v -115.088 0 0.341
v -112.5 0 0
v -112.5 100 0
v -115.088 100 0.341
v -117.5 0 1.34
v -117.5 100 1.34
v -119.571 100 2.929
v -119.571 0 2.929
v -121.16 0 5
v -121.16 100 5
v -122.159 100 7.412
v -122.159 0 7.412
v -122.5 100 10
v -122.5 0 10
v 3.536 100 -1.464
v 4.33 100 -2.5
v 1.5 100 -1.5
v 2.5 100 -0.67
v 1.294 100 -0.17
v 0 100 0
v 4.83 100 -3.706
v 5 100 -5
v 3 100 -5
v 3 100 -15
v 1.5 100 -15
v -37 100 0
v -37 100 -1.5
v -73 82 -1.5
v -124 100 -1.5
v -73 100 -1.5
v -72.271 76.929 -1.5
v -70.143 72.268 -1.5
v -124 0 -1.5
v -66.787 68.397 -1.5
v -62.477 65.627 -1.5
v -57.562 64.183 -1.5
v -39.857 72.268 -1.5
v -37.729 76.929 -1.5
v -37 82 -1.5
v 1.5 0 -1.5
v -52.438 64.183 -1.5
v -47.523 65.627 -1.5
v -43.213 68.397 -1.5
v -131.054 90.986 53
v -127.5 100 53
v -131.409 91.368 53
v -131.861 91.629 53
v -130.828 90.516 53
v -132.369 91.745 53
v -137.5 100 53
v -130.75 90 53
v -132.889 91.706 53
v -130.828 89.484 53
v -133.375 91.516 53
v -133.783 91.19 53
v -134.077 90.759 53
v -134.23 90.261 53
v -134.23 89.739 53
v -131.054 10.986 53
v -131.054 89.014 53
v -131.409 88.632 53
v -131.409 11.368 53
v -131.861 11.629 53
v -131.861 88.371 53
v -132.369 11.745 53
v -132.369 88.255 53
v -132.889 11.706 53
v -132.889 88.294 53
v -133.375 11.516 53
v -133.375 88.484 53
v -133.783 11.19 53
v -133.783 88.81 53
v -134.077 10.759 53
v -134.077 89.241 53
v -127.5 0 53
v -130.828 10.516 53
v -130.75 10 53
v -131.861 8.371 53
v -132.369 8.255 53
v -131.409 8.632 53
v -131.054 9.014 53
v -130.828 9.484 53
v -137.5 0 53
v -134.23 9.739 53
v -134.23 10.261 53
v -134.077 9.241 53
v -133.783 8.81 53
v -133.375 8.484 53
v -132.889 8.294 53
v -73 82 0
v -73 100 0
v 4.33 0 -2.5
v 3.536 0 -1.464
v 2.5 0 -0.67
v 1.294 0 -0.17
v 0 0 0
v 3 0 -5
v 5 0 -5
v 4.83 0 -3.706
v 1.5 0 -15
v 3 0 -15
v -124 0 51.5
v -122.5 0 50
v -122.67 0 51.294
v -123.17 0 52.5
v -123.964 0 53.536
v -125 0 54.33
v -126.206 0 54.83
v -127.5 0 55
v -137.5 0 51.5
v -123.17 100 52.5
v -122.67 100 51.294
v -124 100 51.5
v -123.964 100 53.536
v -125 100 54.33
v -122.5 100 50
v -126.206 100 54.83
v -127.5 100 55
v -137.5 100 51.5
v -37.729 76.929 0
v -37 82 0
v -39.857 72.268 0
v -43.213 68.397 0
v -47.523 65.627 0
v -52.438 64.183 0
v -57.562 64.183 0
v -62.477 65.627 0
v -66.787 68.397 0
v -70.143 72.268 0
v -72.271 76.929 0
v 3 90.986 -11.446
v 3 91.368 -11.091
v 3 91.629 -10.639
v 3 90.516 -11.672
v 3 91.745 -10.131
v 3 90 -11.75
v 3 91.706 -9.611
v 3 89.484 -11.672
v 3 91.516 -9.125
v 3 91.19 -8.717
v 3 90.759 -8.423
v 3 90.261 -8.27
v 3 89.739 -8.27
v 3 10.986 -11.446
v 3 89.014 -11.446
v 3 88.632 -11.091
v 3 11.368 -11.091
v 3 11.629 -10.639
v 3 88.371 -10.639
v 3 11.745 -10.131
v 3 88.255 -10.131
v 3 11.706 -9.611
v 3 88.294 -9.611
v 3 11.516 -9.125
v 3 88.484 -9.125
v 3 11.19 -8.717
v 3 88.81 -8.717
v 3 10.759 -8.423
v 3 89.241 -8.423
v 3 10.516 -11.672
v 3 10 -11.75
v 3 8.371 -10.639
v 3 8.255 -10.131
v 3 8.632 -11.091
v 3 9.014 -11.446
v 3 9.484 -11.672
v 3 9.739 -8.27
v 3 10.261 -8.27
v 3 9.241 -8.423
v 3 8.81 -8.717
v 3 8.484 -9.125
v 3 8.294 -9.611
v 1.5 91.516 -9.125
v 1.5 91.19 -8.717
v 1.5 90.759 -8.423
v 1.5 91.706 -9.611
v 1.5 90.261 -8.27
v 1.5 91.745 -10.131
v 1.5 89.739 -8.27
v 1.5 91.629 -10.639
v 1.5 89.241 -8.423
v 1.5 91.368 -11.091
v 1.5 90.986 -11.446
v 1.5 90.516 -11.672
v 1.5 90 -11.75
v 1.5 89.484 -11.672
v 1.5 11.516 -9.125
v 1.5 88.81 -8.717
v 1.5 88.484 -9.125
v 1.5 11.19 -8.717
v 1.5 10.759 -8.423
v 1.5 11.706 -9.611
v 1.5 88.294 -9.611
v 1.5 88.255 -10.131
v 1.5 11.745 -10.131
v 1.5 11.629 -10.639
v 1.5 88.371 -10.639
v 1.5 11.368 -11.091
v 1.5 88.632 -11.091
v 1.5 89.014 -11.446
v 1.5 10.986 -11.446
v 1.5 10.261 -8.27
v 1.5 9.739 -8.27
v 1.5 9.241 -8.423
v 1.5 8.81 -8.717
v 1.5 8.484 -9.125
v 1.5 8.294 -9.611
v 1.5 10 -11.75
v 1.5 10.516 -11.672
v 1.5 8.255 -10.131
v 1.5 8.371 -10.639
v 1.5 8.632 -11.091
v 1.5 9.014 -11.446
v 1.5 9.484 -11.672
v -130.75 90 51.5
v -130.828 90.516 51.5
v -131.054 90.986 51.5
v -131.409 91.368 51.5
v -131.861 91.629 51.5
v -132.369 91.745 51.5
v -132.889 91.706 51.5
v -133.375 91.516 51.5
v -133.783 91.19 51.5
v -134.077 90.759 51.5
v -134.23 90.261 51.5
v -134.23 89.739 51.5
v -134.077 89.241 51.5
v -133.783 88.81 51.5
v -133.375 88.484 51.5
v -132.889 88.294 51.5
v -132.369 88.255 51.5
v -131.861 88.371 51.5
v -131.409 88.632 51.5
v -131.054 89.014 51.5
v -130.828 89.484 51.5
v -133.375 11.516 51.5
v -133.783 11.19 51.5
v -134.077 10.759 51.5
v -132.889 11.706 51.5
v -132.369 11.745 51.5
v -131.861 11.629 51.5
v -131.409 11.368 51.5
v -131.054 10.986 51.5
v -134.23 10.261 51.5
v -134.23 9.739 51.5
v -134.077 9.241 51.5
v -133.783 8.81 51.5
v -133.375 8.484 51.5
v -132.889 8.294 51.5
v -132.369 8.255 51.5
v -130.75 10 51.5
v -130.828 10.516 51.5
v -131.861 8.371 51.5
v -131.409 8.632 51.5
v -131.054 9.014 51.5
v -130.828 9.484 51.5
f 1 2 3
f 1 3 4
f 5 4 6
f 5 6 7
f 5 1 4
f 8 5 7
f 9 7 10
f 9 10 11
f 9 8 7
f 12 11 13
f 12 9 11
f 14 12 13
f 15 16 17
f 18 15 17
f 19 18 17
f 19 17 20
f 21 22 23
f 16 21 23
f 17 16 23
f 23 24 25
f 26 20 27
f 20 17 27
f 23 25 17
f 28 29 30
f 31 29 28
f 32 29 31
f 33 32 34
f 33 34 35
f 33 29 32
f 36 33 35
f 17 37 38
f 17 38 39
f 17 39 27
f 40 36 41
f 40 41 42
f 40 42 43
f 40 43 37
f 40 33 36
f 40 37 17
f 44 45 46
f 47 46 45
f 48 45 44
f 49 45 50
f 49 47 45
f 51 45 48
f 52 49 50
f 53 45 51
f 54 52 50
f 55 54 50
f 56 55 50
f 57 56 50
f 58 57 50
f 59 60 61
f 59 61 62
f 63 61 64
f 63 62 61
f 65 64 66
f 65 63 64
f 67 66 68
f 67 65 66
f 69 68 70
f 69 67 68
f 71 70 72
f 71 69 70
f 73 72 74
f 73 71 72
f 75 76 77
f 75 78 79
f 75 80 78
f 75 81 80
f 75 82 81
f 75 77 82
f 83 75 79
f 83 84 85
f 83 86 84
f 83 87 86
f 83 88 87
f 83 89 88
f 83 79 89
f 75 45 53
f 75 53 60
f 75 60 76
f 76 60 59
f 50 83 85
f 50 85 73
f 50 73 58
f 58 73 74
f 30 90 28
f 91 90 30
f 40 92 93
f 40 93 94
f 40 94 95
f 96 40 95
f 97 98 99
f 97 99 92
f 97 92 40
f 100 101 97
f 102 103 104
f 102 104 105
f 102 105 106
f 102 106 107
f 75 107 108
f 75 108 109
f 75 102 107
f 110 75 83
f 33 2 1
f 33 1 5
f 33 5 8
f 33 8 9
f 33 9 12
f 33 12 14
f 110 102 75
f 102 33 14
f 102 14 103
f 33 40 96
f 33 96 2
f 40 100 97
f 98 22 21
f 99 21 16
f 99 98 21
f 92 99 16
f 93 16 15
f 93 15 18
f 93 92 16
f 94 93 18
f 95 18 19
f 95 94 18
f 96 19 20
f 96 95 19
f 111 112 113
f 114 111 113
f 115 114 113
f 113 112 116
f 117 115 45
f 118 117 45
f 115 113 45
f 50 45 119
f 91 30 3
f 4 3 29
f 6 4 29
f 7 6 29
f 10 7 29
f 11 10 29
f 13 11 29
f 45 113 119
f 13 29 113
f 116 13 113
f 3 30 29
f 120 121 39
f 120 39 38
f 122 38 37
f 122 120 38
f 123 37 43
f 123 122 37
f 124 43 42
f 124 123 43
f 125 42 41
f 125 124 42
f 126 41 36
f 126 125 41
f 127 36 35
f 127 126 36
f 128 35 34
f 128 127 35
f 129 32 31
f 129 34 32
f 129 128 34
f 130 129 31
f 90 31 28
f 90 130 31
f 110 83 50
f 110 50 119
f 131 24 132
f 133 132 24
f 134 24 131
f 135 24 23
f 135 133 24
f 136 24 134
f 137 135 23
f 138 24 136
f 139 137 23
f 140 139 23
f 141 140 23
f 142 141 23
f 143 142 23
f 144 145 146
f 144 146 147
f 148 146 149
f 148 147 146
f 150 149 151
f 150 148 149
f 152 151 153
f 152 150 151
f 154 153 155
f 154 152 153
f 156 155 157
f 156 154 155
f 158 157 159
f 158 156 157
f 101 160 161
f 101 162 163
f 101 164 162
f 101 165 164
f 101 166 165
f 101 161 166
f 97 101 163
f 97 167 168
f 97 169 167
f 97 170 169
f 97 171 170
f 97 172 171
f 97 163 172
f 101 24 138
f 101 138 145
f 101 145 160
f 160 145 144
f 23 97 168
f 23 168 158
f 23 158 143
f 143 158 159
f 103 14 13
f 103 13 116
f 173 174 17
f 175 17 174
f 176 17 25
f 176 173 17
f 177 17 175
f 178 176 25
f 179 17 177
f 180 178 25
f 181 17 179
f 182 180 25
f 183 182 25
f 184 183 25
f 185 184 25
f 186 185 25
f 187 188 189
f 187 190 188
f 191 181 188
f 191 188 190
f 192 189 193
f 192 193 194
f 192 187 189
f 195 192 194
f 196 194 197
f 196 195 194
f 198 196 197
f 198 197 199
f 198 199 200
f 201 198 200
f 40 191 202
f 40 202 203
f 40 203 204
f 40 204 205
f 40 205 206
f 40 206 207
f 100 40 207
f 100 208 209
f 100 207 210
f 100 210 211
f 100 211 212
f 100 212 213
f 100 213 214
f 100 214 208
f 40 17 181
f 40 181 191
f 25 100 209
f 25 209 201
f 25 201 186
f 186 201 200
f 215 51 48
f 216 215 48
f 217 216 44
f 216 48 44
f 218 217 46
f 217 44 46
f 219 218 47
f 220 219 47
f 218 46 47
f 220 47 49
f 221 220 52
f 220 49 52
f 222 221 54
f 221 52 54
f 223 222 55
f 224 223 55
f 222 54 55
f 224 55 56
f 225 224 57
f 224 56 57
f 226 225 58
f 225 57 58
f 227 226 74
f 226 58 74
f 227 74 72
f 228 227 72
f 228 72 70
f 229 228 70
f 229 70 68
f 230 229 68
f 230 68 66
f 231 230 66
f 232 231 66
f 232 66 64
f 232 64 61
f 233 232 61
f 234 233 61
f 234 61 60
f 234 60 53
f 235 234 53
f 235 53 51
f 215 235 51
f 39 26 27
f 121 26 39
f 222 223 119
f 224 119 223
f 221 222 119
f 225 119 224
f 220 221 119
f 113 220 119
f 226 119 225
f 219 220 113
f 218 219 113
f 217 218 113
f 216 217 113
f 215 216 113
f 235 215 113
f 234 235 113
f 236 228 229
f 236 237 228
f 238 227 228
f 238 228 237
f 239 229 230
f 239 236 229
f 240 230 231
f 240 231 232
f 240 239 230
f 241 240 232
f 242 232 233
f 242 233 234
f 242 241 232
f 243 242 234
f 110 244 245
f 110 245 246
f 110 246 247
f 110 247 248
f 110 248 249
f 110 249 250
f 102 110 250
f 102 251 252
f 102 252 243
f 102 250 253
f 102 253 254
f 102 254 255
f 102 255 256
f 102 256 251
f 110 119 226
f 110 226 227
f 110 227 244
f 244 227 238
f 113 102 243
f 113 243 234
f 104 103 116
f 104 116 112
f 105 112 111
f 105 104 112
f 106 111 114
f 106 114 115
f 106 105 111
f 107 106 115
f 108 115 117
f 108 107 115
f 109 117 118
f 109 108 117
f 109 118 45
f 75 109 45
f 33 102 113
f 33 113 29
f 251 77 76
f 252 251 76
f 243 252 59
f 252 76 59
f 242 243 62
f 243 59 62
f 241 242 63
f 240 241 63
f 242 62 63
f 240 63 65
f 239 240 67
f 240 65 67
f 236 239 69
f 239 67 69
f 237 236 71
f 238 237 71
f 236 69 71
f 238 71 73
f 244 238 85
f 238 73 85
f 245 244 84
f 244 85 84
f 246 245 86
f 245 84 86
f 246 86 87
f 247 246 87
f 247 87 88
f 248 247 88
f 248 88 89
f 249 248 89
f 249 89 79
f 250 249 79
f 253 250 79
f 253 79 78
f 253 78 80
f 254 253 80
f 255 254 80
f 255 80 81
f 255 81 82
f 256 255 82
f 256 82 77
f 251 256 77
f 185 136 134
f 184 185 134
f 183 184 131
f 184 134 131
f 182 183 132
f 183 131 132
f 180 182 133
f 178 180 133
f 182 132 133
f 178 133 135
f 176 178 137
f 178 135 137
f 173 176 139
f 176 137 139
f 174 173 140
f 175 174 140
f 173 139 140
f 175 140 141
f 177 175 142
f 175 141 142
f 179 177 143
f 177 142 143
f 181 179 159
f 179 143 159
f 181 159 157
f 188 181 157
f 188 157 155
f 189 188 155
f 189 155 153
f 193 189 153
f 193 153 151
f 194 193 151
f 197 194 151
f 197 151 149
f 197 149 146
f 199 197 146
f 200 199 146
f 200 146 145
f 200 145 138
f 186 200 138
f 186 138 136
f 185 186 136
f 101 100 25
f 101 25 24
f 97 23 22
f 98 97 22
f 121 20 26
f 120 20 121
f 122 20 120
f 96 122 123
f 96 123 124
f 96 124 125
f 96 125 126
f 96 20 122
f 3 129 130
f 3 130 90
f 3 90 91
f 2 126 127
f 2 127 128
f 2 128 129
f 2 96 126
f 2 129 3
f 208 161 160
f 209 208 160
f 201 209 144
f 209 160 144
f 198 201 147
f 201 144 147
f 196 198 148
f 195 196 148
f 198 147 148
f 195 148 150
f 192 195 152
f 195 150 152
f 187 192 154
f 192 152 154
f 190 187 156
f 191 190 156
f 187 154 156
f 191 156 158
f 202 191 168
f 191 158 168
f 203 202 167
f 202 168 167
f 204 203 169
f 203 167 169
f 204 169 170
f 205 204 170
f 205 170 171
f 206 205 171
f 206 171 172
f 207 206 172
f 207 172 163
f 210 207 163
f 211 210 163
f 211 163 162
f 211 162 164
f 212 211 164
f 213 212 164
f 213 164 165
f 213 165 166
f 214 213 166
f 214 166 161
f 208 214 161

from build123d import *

# Parameters (mm, degrees)
EXTRUDE_1_DEPTH     = 100
CUT_EXTRUDE_1_DEPTH = 10
SKETCH_3_R          = 1.75
CUT_EXTRUDE_2_DEPTH = 10
SKETCH_4_R          = 1.75
CUT_EXTRUDE_3_DEPTH = 10


with BuildPart() as part:
    # Эскиз1 → Бобышка-Вытянуть1 (new body)
    with BuildSketch(Plane(origin=(0, 0, 0), x_dir=(1, 0, 0), z_dir=(0, 1, 0))):
        with BuildLine():
            Line((0, 0), (-112.5, 0))
            ThreePointArc((-112.5, 0), (-119.571067812, -2.928932188), (-122.5, -10))
            Line((-122.5, -10), (-122.5, -50))
            ThreePointArc((-122.5, -50), (-123.964466094, -53.535533906), (-127.5, -55))
            Line((-127.5, -55), (-127.5, -53))
            Line((-127.5, -53), (-137.5, -53))
            Line((-137.5, -53), (-137.5, -51.5))
            Line((-137.5, -51.5), (-124, -51.5))
            Line((-124, -51.5), (-124, 1.5))
            Line((-124, 1.5), (1.5, 1.5))
            Line((1.5, 1.5), (1.5, 15))
            Line((1.5, 15), (3, 15))
            Line((3, 15), (3, 5))
            Line((3, 5), (5, 5))
            ThreePointArc((5, 5), (3.535533906, 1.464466094), (0, 0))
        make_face()
    extrude(amount=EXTRUDE_1_DEPTH)

    # Эскиз2 → Вырез-Вытянуть1 (cut)
    with BuildSketch(Plane.XY):
        with BuildLine():
            Line((-73, 100), (-37, 100))
            Line((-37, 100), (-37, 82.000001723))
            ThreePointArc((-37, 82.000001723), (-54.999999139, 64.000000861), (-73, 82))
            Line((-73, 82), (-73, 100))
        make_face()
    extrude(amount=-CUT_EXTRUDE_1_DEPTH, mode=Mode.SUBTRACT)

    # Эскиз3 → Вырез-Вытянуть2 (cut)
    with BuildSketch(Plane(origin=(3, 0, 0), x_dir=(0, 0, -1), z_dir=(1, 0, 0))):
        with Locations((10, 90)):
            Circle(SKETCH_3_R)
        with Locations((10, 10)):
            Circle(SKETCH_3_R)
    extrude(amount=-CUT_EXTRUDE_2_DEPTH, mode=Mode.SUBTRACT)

    # Эскиз4 → Вырез-Вытянуть3 (cut)
    with BuildSketch(Plane.XY.offset(53)):
        with Locations((-132.5, 90)):
            Circle(SKETCH_4_R)
        with Locations((-132.5, 10)):
            Circle(SKETCH_4_R)
    extrude(amount=-CUT_EXTRUDE_3_DEPTH, mode=Mode.SUBTRACT)


solid = part.part
